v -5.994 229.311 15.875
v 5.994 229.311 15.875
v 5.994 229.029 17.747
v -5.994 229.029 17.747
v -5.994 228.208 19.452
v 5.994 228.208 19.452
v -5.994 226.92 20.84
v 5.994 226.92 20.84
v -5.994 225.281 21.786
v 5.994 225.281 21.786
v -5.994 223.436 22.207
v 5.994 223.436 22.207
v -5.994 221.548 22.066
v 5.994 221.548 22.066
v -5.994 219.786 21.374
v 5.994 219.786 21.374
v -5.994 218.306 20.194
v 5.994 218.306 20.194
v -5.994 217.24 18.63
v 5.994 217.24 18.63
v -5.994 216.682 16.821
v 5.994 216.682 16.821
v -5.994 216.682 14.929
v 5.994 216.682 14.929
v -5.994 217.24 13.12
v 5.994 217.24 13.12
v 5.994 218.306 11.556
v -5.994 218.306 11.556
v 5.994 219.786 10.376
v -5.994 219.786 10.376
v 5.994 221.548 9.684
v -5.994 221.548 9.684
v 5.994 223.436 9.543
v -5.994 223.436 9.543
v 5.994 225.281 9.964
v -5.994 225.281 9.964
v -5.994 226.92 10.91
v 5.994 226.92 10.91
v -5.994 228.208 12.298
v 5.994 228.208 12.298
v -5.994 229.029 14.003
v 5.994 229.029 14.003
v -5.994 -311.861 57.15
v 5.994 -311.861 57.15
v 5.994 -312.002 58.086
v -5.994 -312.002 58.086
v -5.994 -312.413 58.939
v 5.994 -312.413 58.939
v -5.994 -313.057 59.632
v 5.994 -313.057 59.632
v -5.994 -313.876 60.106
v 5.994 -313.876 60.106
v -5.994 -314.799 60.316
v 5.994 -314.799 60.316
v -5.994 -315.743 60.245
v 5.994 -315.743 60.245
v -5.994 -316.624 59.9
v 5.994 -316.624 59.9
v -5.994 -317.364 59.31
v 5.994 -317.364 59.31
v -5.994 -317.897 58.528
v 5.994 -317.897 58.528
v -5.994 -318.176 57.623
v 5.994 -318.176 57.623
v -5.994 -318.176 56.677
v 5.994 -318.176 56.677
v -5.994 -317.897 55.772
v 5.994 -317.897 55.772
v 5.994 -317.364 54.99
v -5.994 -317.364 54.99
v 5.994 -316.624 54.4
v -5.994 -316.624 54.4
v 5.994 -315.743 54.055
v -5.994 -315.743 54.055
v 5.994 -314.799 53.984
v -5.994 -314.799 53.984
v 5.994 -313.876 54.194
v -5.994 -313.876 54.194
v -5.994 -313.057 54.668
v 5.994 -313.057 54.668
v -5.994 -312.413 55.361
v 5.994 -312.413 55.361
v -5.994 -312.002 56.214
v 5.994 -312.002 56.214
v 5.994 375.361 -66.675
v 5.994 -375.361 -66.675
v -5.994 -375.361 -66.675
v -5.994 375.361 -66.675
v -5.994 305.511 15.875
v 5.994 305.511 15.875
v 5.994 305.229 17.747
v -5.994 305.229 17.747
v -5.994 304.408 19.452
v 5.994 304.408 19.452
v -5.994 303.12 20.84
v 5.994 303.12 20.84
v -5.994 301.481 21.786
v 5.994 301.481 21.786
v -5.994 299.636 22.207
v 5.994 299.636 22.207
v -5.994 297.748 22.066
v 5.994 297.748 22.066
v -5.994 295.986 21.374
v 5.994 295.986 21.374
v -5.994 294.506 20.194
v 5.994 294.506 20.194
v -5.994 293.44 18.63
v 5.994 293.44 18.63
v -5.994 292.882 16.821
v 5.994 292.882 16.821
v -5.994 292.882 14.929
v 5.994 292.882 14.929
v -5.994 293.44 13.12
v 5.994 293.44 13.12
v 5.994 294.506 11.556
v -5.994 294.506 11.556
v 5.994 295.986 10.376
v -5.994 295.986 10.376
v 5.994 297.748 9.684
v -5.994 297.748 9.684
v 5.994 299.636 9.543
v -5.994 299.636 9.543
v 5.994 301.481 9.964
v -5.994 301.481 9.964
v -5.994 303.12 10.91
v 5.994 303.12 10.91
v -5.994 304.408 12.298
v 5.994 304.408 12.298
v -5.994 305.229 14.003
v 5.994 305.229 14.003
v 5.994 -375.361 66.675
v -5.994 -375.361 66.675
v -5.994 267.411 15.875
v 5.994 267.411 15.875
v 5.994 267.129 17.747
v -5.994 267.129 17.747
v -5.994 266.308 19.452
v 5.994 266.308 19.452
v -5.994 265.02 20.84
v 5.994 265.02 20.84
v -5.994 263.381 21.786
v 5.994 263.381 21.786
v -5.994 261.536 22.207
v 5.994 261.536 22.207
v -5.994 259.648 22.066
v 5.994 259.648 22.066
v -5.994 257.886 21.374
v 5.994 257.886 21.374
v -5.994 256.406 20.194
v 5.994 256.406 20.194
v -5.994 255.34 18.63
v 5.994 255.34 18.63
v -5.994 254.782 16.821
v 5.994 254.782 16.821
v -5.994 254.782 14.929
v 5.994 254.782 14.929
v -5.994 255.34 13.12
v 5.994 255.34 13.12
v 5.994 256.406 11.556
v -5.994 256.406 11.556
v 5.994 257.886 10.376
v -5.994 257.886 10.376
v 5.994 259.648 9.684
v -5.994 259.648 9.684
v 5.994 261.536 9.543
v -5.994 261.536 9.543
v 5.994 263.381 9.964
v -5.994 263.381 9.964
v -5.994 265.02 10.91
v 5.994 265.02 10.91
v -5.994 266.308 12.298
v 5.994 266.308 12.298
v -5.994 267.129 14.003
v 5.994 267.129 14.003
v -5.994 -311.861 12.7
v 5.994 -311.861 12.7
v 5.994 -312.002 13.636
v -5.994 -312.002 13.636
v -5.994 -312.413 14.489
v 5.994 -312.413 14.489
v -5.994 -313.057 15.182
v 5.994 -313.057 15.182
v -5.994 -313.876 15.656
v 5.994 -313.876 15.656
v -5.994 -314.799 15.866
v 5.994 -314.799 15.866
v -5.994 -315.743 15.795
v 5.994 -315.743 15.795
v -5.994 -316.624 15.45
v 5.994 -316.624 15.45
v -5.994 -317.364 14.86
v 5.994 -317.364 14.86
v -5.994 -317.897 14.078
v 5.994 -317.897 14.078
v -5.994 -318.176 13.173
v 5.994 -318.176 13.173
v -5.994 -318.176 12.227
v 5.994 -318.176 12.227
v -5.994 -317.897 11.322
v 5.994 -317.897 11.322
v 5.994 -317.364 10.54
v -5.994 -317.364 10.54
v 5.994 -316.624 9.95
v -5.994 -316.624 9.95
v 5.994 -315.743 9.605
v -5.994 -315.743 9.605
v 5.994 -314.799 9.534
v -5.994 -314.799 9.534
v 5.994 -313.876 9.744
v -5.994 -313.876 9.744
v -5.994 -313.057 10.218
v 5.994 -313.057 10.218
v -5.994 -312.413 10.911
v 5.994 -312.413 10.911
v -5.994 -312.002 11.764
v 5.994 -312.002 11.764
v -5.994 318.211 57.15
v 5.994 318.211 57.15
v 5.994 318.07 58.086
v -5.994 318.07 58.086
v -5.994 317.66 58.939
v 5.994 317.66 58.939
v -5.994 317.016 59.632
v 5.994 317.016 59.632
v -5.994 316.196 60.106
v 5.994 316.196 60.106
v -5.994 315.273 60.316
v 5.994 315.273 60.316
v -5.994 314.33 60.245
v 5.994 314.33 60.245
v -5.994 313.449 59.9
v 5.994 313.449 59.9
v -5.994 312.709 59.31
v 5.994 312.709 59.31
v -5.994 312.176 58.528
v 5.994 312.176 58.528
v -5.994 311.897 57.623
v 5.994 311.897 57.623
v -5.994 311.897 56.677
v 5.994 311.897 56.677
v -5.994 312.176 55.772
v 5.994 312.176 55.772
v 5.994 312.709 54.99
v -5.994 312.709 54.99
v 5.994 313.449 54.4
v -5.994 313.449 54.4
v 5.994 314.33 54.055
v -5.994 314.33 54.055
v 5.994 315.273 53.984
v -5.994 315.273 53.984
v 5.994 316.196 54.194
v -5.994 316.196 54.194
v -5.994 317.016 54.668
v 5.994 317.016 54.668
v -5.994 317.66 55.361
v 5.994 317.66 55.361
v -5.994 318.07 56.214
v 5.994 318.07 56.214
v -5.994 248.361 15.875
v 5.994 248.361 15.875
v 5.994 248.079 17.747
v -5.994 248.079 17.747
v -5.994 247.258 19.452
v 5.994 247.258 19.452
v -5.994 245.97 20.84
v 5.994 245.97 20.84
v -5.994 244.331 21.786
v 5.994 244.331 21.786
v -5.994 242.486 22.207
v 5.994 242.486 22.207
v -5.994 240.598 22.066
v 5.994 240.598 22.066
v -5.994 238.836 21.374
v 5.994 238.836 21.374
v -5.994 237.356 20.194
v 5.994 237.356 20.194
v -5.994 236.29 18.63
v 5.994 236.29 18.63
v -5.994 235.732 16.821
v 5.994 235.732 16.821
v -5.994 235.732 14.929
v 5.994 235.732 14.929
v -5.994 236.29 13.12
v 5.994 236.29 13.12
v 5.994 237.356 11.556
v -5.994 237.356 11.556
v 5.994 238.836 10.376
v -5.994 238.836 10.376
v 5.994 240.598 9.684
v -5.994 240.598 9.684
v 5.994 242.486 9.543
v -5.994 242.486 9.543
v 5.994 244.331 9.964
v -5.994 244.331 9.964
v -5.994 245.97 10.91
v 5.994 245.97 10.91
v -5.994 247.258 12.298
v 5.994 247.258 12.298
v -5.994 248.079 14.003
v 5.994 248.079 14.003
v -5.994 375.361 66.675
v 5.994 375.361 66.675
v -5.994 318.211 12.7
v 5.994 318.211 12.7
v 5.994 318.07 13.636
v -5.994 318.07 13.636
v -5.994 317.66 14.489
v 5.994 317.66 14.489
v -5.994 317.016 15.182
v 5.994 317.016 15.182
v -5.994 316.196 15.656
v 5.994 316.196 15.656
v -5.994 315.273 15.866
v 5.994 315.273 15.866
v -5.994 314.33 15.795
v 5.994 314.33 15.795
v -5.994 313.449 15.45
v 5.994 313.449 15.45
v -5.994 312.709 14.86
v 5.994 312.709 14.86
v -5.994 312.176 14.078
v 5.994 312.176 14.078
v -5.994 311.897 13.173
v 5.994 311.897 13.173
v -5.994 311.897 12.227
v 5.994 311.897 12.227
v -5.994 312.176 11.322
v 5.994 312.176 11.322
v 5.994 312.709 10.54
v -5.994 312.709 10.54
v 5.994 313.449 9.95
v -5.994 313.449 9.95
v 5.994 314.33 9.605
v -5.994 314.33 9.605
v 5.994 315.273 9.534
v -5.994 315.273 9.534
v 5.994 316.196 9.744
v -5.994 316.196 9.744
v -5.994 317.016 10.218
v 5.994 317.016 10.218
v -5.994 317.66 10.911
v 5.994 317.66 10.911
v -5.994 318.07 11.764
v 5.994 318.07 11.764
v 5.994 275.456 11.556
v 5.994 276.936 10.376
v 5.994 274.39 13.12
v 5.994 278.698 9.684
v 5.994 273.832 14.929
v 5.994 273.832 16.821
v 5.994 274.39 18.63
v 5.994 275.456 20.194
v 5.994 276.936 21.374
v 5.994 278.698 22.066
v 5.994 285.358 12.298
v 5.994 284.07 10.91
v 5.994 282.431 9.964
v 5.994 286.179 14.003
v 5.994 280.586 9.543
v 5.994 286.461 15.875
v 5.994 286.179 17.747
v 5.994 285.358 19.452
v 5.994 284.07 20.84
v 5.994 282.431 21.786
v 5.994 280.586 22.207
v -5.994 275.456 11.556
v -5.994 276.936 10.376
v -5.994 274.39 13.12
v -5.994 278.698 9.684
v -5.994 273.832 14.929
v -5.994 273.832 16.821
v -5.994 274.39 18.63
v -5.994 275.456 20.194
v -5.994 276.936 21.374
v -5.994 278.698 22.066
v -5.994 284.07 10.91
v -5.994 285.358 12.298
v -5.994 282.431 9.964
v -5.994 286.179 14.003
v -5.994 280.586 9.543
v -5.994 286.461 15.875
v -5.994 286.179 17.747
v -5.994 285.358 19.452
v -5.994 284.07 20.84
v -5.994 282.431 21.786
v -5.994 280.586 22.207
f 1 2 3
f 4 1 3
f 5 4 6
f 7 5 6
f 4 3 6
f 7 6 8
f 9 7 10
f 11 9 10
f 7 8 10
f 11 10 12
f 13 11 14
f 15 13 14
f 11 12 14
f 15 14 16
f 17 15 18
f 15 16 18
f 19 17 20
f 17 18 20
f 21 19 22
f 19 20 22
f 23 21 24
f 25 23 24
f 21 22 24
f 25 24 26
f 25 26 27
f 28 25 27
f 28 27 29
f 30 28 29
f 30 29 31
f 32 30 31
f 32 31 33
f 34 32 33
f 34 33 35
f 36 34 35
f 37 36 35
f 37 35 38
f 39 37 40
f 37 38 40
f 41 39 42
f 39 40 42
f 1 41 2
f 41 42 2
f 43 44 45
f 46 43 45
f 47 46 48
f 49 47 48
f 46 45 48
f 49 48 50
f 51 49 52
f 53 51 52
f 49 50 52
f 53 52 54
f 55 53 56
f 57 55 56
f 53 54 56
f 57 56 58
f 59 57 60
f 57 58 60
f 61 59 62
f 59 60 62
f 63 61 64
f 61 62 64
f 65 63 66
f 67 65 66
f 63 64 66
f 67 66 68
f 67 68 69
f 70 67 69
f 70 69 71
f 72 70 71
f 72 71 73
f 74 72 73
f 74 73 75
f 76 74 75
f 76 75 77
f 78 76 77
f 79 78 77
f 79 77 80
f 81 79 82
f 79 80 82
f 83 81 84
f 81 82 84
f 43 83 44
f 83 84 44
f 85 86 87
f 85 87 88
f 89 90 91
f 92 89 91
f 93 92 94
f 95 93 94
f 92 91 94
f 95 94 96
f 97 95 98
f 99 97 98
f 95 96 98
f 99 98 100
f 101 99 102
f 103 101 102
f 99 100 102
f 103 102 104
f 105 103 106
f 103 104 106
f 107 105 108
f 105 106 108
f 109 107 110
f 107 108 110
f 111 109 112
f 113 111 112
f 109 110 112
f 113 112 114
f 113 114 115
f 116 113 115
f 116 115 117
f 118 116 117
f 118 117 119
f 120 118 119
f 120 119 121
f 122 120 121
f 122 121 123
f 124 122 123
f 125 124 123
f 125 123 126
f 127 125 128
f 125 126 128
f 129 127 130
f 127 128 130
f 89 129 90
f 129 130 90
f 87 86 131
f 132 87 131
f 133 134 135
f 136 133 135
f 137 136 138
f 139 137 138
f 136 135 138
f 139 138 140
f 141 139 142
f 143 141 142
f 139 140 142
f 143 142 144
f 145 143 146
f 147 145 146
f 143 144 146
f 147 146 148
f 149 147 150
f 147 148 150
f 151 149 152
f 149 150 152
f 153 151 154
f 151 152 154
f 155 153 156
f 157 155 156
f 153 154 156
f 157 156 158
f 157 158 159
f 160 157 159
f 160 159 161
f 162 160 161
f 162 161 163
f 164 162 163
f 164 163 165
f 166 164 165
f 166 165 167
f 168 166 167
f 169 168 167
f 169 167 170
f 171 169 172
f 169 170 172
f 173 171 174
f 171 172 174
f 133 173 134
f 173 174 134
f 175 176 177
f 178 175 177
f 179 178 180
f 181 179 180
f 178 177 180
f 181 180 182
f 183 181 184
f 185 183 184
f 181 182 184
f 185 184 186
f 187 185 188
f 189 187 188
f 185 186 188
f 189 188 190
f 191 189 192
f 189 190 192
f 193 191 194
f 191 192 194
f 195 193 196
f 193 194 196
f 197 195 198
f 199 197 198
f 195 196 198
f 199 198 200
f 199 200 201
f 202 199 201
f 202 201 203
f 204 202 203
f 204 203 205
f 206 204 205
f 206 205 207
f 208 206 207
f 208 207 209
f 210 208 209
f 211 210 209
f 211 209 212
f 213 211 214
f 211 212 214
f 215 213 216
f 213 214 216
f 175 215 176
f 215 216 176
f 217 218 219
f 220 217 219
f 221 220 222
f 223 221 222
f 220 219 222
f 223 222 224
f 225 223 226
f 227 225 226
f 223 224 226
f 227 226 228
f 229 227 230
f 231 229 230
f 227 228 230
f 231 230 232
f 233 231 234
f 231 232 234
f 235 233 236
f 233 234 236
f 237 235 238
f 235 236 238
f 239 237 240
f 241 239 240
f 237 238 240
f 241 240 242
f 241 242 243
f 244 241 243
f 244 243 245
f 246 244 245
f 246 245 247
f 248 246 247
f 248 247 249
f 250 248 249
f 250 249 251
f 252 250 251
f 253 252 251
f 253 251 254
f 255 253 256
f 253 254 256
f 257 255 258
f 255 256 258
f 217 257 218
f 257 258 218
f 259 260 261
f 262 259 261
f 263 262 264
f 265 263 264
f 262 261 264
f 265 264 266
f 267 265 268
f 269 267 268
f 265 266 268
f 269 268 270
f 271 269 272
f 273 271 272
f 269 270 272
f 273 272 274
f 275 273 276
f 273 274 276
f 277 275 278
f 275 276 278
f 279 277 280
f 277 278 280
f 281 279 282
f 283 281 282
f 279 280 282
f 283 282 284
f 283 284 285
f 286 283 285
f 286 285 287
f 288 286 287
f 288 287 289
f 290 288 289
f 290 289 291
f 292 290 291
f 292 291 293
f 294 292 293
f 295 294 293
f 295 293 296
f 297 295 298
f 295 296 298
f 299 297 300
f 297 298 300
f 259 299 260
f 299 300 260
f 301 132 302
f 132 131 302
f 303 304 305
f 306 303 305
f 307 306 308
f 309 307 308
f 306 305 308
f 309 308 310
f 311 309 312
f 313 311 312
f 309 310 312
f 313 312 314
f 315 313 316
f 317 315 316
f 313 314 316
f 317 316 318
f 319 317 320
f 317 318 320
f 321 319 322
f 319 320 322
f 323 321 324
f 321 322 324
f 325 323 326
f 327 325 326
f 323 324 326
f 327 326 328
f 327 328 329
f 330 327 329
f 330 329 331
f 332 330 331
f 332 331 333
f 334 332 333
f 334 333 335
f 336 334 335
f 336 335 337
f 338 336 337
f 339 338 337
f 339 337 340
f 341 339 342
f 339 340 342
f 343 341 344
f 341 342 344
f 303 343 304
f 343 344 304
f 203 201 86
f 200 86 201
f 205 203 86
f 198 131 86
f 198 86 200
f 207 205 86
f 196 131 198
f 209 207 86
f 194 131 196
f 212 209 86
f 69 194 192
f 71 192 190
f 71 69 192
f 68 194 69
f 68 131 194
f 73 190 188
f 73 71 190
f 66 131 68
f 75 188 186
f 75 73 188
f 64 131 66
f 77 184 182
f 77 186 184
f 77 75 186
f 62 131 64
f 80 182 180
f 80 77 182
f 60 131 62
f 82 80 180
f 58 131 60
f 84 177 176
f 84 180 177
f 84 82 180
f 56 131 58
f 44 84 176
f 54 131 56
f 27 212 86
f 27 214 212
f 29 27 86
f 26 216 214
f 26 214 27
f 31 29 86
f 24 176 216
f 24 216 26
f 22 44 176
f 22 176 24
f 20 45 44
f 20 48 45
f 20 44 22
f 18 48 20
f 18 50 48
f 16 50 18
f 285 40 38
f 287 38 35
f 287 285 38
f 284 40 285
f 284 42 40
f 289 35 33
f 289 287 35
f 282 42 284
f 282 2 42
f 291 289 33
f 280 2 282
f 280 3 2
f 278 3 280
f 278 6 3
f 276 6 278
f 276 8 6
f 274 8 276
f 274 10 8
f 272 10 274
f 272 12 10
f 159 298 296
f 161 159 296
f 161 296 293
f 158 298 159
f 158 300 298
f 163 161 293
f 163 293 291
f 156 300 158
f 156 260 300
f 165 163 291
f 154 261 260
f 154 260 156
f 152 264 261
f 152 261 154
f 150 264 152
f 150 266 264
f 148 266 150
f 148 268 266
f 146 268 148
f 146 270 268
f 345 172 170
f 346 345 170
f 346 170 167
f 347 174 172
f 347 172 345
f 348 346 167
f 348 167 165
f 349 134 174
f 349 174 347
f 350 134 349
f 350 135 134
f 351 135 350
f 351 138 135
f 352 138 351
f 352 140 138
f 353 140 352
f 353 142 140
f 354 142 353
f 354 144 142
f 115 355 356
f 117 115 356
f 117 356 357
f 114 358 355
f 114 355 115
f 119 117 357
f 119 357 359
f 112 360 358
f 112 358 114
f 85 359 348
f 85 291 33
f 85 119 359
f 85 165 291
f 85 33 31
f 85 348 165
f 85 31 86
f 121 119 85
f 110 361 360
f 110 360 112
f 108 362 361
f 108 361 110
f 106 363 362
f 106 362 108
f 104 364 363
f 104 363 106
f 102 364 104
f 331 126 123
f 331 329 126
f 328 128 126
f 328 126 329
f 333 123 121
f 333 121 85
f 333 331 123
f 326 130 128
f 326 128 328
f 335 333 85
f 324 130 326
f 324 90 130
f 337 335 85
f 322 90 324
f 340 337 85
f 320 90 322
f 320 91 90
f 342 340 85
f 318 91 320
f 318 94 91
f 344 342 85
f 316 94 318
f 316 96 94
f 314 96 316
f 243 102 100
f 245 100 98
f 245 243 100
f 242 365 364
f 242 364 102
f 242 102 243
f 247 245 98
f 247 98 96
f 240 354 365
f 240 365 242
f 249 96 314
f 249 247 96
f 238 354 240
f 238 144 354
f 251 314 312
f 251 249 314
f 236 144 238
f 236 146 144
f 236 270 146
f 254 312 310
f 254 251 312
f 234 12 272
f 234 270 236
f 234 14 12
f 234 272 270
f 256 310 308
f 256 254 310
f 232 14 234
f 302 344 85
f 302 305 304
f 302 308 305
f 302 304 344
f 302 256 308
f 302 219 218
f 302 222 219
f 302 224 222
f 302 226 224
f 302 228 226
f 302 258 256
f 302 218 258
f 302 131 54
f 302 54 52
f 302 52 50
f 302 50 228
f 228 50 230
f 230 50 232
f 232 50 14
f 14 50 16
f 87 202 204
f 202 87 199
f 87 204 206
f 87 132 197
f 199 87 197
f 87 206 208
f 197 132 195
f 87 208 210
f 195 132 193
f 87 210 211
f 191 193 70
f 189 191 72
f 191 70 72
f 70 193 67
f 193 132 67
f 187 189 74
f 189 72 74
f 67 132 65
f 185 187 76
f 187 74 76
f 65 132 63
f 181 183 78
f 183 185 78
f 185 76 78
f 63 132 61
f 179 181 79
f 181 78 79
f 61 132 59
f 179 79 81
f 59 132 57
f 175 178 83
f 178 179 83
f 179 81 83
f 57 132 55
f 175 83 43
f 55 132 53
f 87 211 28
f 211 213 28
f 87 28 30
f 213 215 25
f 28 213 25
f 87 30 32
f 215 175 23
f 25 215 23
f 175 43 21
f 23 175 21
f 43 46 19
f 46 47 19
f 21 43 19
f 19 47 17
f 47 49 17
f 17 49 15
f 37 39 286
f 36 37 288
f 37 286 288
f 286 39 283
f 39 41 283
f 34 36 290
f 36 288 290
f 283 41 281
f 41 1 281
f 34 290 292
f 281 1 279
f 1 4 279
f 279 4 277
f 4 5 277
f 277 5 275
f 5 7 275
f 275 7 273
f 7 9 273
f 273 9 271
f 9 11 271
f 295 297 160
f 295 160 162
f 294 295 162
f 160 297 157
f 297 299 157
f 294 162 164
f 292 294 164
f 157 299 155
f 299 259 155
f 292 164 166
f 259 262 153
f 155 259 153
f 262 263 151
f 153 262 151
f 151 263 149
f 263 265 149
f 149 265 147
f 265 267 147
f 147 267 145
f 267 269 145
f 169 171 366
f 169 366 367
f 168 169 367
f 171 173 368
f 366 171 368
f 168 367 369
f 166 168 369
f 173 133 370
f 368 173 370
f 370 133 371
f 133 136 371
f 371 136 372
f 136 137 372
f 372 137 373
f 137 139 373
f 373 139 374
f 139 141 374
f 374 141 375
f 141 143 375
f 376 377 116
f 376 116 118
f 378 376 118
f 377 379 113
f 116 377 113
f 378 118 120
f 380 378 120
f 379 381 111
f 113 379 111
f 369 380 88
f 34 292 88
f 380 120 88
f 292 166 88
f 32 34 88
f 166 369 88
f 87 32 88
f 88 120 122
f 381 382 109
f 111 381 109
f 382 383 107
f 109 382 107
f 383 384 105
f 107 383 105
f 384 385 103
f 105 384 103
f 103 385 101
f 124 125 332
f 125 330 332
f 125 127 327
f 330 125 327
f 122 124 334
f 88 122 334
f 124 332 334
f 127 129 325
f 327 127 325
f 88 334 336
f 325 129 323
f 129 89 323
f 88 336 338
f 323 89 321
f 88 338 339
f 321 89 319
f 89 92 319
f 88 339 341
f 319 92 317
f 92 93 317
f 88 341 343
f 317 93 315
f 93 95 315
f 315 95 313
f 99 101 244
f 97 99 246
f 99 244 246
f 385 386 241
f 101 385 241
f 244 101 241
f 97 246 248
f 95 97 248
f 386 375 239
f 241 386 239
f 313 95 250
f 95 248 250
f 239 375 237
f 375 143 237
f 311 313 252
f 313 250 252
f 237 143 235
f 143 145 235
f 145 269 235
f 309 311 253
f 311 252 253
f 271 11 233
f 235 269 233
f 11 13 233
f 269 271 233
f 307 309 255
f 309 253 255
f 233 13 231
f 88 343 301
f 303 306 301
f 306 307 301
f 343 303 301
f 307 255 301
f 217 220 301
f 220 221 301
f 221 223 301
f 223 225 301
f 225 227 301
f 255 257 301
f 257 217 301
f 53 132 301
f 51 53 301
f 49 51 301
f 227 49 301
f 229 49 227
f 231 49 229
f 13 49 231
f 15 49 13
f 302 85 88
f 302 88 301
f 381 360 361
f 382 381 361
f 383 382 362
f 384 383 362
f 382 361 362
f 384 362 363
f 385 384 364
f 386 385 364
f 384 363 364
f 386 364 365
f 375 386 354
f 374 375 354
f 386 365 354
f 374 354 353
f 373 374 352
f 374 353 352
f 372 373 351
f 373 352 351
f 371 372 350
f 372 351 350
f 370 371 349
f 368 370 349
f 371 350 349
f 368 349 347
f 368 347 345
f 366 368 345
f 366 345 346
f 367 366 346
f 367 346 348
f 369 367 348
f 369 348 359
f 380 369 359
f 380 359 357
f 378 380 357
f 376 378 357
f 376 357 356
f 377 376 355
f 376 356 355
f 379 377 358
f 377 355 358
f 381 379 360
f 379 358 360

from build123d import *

# Parameters (mm, degrees)
F0_W     = 750.7224
F0_H     = 133.35
F1_DEPTH = 5.9944
F2_R     = 6.35
F3_DEPTH = 11.9888
F4_R     = 3.175
F5_DEPTH = 11.9888


with BuildPart() as f1:
    # F0 (on Right) → F1 (new body, symmetric)
    with BuildSketch(Plane.YZ):
        Rectangle(F0_W, F0_H)
    extrude(amount=F1_DEPTH, both=True)

    # F2 (on face) → F3 (cut, through all)
    with BuildSketch(Plane.YZ.offset(5.9944)):
        with Locations((222.9612, 15.875)):
            Circle(F2_R)
        with Locations((242.0112, 15.875)):
            Circle(F2_R)
        with Locations((261.0612, 15.875)):
            Circle(F2_R)
        with Locations((280.1112, 15.875)):
            Circle(F2_R)
        with Locations((299.1612, 15.875)):
            Circle(F2_R)
    extrude(amount=-F3_DEPTH, mode=Mode.SUBTRACT)

    # F4 (on face) → F5 (cut, through all)
    with BuildSketch(Plane.YZ.offset(5.9944)):
        with Locations((-315.0362, 57.15)):
            Circle(F4_R)
        with Locations((-315.0362, 12.7)):
            Circle(F4_R)
        with Locations((315.0362, 12.7)):
            Circle(F4_R)
        with Locations((315.0362, 57.15)):
            Circle(F4_R)
    extrude(amount=-F5_DEPTH, mode=Mode.SUBTRACT)


solid = f1.part
